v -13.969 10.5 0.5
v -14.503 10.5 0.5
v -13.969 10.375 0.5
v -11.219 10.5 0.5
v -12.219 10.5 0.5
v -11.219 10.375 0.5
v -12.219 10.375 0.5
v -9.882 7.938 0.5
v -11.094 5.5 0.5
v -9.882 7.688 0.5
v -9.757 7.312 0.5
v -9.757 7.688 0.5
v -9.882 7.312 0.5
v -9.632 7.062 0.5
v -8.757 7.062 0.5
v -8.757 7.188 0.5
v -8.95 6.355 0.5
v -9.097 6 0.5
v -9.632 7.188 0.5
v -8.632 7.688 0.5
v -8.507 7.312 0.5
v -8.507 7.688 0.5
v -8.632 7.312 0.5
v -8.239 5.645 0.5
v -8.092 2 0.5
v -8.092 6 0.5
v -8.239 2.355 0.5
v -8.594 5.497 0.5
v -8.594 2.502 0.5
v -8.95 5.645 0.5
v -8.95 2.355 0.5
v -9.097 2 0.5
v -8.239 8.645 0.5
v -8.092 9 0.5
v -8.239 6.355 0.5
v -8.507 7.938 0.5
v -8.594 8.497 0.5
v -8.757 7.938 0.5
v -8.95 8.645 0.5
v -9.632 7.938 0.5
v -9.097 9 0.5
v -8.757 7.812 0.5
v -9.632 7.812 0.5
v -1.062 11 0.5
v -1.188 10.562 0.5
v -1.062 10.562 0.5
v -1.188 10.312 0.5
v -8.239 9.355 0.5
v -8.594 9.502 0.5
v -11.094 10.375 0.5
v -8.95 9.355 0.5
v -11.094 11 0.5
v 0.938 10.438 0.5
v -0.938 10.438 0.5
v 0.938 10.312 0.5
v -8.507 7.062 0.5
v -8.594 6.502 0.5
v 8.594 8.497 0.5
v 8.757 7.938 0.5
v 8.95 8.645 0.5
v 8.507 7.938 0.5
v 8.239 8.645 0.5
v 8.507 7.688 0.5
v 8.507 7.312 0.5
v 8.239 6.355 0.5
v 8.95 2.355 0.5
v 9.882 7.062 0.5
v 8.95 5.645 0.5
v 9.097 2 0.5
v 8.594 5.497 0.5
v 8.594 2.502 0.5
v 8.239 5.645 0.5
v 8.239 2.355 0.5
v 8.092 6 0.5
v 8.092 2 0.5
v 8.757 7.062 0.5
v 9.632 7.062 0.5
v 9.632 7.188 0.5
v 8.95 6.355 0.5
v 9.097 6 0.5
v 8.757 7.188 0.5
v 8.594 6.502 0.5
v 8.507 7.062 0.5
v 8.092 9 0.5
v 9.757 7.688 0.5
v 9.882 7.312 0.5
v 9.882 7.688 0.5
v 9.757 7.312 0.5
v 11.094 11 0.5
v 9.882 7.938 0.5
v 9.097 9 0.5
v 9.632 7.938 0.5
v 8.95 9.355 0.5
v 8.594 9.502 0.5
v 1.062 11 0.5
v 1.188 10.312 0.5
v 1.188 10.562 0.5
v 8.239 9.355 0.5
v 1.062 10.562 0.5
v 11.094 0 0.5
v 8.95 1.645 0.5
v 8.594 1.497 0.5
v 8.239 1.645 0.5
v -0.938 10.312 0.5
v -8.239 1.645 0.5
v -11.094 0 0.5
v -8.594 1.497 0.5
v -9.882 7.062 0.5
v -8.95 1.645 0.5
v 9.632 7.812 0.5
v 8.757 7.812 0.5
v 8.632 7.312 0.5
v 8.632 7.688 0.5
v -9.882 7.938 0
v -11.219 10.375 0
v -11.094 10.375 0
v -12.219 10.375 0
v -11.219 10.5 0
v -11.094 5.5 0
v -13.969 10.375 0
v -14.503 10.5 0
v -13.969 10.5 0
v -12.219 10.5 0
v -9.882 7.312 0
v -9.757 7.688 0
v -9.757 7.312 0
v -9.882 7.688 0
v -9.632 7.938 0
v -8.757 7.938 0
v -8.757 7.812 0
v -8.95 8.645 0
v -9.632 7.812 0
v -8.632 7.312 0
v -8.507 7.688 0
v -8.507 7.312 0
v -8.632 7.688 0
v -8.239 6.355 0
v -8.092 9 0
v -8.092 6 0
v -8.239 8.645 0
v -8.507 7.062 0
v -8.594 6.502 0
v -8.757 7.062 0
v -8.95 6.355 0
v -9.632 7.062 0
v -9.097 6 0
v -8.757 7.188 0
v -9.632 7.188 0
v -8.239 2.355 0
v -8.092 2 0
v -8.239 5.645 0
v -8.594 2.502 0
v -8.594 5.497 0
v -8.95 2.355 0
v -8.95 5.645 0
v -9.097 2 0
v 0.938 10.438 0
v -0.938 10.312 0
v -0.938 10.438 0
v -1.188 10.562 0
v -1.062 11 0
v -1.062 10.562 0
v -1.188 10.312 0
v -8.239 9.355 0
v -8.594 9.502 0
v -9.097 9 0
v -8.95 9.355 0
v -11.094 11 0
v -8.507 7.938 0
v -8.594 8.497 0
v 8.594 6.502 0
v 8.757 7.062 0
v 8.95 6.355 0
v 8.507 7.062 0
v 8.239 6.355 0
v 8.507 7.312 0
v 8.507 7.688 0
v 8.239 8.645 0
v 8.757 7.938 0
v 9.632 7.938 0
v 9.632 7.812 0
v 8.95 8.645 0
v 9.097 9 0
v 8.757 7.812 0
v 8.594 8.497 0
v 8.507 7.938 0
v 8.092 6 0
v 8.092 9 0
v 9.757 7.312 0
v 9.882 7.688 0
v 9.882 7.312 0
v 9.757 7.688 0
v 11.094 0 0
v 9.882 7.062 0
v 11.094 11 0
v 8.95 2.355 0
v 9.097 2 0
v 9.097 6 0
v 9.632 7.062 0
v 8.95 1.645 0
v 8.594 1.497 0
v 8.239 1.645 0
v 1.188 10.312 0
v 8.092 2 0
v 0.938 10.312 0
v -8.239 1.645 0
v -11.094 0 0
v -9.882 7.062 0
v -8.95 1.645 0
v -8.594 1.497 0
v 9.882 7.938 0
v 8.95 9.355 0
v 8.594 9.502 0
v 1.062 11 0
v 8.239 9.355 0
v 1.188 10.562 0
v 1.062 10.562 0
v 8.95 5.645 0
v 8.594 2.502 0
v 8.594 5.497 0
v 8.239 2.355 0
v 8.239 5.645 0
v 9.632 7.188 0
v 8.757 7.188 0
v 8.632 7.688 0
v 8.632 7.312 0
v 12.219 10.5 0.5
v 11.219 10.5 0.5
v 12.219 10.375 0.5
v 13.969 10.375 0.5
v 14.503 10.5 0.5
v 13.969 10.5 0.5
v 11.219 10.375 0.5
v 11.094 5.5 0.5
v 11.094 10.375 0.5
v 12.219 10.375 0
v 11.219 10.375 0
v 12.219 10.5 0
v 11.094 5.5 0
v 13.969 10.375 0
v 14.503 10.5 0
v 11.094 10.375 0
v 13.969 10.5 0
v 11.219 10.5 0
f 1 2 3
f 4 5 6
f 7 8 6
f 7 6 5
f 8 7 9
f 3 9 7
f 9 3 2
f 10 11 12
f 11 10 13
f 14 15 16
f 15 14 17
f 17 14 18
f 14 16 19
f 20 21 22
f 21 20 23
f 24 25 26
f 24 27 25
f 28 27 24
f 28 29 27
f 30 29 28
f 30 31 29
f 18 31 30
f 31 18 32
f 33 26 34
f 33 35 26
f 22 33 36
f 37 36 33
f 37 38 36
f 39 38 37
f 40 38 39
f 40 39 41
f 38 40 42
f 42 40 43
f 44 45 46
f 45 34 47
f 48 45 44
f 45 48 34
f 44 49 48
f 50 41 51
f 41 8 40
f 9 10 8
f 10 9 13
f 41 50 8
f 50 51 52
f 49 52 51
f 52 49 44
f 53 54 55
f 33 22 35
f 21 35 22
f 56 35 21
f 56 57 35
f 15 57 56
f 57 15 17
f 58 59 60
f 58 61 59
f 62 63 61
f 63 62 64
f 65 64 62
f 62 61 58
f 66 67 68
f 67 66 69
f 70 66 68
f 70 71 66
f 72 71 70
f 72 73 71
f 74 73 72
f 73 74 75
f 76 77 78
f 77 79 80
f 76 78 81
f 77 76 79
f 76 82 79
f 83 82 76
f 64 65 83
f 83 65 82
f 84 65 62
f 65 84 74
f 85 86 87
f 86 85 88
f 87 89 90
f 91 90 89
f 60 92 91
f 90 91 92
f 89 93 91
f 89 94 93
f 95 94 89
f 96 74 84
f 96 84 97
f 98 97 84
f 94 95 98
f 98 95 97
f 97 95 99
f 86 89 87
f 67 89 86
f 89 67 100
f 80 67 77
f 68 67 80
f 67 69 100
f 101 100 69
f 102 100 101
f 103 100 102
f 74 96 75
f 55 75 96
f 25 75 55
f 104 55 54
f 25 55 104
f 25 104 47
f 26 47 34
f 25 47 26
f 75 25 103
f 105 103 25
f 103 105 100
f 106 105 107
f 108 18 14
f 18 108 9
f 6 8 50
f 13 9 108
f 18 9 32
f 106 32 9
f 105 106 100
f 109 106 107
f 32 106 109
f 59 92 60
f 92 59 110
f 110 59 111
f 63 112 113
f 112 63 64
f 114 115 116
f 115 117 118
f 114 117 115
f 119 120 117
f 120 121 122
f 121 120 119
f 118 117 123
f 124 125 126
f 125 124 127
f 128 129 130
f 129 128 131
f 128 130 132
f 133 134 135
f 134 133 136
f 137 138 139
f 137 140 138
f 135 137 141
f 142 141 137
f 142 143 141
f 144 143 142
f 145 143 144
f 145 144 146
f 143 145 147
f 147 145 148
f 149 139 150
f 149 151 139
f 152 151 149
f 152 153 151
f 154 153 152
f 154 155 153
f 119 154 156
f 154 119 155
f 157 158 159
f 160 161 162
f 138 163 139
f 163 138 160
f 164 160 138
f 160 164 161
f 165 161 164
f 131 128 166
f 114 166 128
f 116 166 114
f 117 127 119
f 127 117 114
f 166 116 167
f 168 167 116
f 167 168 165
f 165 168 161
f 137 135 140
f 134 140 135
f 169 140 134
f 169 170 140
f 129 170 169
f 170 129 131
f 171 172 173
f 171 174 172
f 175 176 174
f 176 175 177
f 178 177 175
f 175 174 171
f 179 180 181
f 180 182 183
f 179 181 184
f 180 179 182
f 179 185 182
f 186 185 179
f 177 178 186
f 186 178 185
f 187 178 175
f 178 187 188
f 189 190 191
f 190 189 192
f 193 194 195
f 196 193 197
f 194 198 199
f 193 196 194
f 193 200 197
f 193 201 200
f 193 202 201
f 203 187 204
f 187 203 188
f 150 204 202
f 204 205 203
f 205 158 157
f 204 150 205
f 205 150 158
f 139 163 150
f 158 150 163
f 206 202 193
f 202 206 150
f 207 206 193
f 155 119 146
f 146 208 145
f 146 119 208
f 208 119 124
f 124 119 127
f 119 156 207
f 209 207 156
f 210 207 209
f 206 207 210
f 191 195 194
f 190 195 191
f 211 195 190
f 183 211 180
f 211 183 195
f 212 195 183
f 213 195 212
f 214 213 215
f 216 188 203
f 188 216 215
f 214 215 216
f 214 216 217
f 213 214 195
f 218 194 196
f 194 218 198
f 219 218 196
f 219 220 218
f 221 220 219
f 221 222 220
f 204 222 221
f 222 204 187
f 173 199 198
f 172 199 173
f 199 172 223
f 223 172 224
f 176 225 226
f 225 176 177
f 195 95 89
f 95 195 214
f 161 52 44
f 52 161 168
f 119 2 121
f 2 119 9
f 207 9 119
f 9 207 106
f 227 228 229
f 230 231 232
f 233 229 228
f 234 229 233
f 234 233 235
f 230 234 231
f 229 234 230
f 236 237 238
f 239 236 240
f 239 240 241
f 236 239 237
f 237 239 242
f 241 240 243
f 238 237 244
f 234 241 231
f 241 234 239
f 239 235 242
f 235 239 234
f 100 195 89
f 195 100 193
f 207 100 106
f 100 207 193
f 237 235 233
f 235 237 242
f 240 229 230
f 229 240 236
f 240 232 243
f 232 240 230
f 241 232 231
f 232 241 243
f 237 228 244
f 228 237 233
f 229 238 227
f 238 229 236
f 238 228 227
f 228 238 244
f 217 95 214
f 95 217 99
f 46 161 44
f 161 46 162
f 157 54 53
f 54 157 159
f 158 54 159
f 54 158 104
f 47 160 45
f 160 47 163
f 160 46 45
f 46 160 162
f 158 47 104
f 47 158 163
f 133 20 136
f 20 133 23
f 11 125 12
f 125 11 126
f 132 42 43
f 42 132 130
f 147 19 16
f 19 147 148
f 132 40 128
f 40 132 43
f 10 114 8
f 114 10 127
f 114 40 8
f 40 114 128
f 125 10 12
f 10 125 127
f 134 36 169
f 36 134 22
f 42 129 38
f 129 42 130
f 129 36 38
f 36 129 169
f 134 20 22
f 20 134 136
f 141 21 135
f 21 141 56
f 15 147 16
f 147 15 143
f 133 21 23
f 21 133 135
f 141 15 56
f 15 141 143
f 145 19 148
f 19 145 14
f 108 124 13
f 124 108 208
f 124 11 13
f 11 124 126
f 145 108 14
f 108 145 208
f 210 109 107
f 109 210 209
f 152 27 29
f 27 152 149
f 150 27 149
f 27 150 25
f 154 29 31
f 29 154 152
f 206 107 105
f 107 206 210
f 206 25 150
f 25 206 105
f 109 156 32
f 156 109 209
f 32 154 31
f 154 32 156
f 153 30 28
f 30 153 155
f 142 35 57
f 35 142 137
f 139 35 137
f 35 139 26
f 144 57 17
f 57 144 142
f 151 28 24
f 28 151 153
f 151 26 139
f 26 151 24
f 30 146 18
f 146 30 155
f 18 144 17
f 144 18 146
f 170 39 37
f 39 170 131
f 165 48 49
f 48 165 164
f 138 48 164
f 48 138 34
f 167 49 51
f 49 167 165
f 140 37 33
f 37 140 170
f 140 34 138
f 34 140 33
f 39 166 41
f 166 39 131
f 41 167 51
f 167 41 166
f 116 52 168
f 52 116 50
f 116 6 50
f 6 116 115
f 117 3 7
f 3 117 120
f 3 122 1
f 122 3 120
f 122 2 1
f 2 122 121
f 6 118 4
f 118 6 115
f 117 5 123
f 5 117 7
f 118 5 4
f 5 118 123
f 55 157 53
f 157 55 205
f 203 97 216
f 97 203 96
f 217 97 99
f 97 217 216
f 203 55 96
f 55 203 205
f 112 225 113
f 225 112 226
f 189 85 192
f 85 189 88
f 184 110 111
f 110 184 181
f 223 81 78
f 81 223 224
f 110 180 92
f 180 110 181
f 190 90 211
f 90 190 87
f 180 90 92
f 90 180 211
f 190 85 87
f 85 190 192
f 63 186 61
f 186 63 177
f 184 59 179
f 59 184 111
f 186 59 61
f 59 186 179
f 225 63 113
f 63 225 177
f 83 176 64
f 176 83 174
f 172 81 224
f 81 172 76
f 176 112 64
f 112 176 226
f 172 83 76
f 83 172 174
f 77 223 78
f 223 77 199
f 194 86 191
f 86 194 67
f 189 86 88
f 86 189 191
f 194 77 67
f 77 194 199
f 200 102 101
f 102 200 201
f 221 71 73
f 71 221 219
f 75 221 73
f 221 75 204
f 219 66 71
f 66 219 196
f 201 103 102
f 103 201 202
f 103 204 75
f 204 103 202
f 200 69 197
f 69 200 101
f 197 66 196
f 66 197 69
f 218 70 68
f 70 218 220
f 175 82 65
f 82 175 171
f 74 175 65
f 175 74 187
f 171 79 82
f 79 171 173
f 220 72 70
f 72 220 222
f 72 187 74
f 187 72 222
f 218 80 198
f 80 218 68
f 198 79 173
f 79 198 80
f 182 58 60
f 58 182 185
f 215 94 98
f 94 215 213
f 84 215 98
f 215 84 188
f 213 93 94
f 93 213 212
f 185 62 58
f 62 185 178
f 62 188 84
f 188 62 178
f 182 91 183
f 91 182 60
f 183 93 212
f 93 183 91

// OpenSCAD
// file: modus.scad
//Corner Joint - allows the sides of two parts to create inlayed corner. Aids with welding.
//need to verify module math is the same throughout all parts.

module cornerjoint(Z,L,H,EndGap,PadL,PadH,CJangle,CJcenter){
    //change so that H = Z of inlayed part (usually 0.5)
    //add center and angle in degrees option, orgin far side of cut out area

     if((CJangle==0)&&(CJcenter==0))
      {    
        translate([0,0,0])
        rotate([0,0,CJangle])
        difference(){
        cube([L,H+PadH,Z]);
        translate([EndGap,H,0])
        cube([PadL,PadH,Z]);
        translate([L-EndGap-PadL,H,0])
        cube([PadL,PadH,Z]);}
      }    
else if((CJangle==90)&&(CJcenter==0))
      {    
        translate([H+PadH,0,0])
        rotate([0,0,CJangle])
        difference(){
        cube([L,H+PadH,Z]);
        translate([EndGap,H,0])
        cube([PadL,PadH,Z]);
        translate([L-EndGap-PadL,H,0])
        cube([PadL,PadH,Z]);}
      }
else if((CJangle==180)&&(CJcenter==0))       
      {    
        translate([L,H+PadH,0])
        rotate([0,0,CJangle])
        difference(){
        cube([L,H+PadH,Z]);
        translate([EndGap,H,0])
        cube([PadL,PadH,Z]);
        translate([L-EndGap-PadL,H,0])
        cube([PadL,PadH,Z]);}
      }
else if((CJangle==270)&&(CJcenter==0))
      {    
        translate([0,L,0])
        rotate([0,0,CJangle])
        difference(){
        cube([L,H+PadH,Z]);
        translate([EndGap,H,0])
        cube([PadL,PadH,Z]);
        translate([L-EndGap-PadL,H,0])
        cube([PadL,PadH,Z]);}
      }  
      
//centered     
   
else if((CJangle==0)&&(CJcenter==1))
      {    
        translate([-L/2,0,0])
        rotate([0,0,CJangle])
        difference(){
        cube([L,H+PadH,Z]);
        translate([EndGap,H,0])
        cube([PadL,PadH,Z]);
        translate([L-EndGap-PadL,H,0])
        cube([PadL,PadH,Z]);}
      }  
else if((CJangle==90)&&(CJcenter==1))
      {    
        translate([0,-L/2,0])
        rotate([0,0,CJangle])
        difference(){
        cube([L,H+PadH,Z]);
        translate([EndGap,H,0])
        cube([PadL,PadH,Z]);
        translate([L-EndGap-PadL,H,0])
        cube([PadL,PadH,Z]);}
      }
else if((CJangle==180)&&(CJcenter==1))       
      {    
        translate([L/2,0,0])
        rotate([0,0,CJangle])
        difference(){
        cube([L,H+PadH,Z]);
        translate([EndGap,H,0])
        cube([PadL,PadH,Z]);
        translate([L-EndGap-PadL,H,0])
        cube([PadL,PadH,Z]);}
      }
else if((CJangle==270)&&(CJcenter==1))
      {    
        translate([0,L/2,0])
        rotate([0,0,CJangle])
        difference(){
        cube([L,H+PadH,Z]);
        translate([EndGap,H,0])
        cube([PadL,PadH,Z]);
        translate([L-EndGap-PadL,H,0])
        cube([PadL,PadH,Z]);}
      }
} //end cornerjoint module

//Tab Insert - used to cut a hole for an abutting part to insert into. Typically aids with welding the two parts.
module tabinsert(X,Y,Z,dGap,cGap,c1,c2,c3,c4,c5,c6,c7,c8,center){
    translate([-dGap-(center*(X/2)),-dGap-(center*(Y/2)),0]){
        //main cut
        cube([X+(dGap*2),Y+(dGap*2),Z]);
        //corner c1c2
        translate([-cGap,(Y+(dGap*2))-c1+cGap,0])
            {
        cube([c2,c1,Z]);}
       //corner c3c4
       translate([(X+(dGap*2))-c3+cGap,(Y+(dGap*2))-c4+cGap,0]){
           cube([c3,c4,Z]);
       }
       //corner c5c6
       translate([(X+(dGap*2))-c6+cGap,-cGap,0])
      {
          cube([c6,c5,Z]);
      }
       
       //corner c7c8 
       translate([-cGap,-cGap,0]){
           cube([c7,c8,Z]);
       }
    
    } //end center translate
} //end tabinsert module
 
// file: vars.scad
brickW=6; 
brickL=12;
brickCH=6;

$fn=8; //defines resolution of circles. 8 is okay for review. 100  or greater should be used for for final dxf export.

dZstandard=0.5; //thickness of steel to be cut for drawer parts
fZstandard=0.5;
aZstandard=0.5; //thickness of steel to be cut for arm parts

fBOLTHOLEstandardD=1; //standard bolts used on frame
sliderodholeOD=1.2; 

dGap=0.03125; //gap between a hole cut's edge and the part sitting within the hole. //D3 appears to use 0.3125, is this in error?

//all parts set to standard thickness below
//off standard preferences can be defined below

//drawer
drawergap=0.0283;  //extra room for drawer to slide in the space between f1 and f4
drawerHgap=0.1884;  //total extra space from drawer sides to frame walls. sum of both sides.

d1z=dZstandard;
d2z=dZstandard;
d3z=dZstandard;
d4z=dZstandard;
d5z=dZstandard;
d6z=dZstandard;
d5z=dZstandard;
d7z=dZstandard;
d8z=dZstandard;
d9z=dZstandard;

//frame
f1x=24.2;
f1y=6;
f1z=0.5;


f2y=3.5;
f2z=fZstandard;

f3x=f1x;
f3y=3.5;
f3z=fZstandard;

f4y=11;
f4z=fZstandard;

f5y=3.5;
f5z=fZstandard;

f6y=8;
f6z=fZstandard;

f8y=brickW;
f8z=fZstandard;
f8boltD=1;

f9y=4.5;
f9x=43.5;  //set based on MAINcylinder
f9z=fZstandard;

f8x=f9x;

f11x=1.25;
f11z=fZstandard;

f13z=fZstandard;

//arms

a1x=4;
a1y=72; //calculate based on drawer cylinder
a1z=aZstandard;

a2x=6;
a2y=72;  //calculate based on drawer cylinder
a2z=aZstandard;

a4z=aZstandard;
a6z=aZstandard;

//
//Input your main cylinder's dimenions here
//
cylinderMAINminC2E=0; //main hydraulic cylinder's distance from center of mounting hole to the end of the shaft when fully compressed.
cylinderMAINmaxC2E=0; //main hydraulic cylinder's distance from center of mounting hole to the end of the shaft when fully extended.

//
//Input your drawer cylinder's dimenions here
//
cylinderDRAWERbodyH=3; //measured when in position, largest length from top to bottom of cylinder
cylinderDRAWERminC2C=0; //drawer's hydraulic cylinder's distance from the center of one mounting hole to the center of the other when fully compressed.
cylinderDRAWERmaxC2C=0; ///drawer's hydraulic cylinder's distance from the center of one mounting hole to the center of the other when fully extended.
cylinderDRAWERrodclevisW=2.5; //width of cylinders' clevis on end of rod
cylinderDRAWERrodclevisID=1;
cylinderDRAWERrodclevisOD=2;
cylinderDRAWERrearclevisW=2.5; //width of mounting clevis cylinder body
cylinderDRAWERrearclevisID=1;
cylinderDRAWERrearclevisOD=2;
cylinderDRAWERrearclevisClearance=3; //usable space around rear clevis pin (in diameter). be aware of hyraulic fittings.

//the following variables are calculated in order of dependence on preceding variables
d3x=brickL+(d2z*2);
d3y=brickCH-d1z;
d4x=brickW+d3z+d3z;
d4y=brickCH-d1z;
d5x=brickL+(d2z*2);
d5y=brickW;
d6x=brickL+(d2z*2);
d6y=brickCH;
d7x=cylinderDRAWERrearclevisClearance;
d7y=a4z+d8z+cylinderDRAWERbodyH;
d9x=cylinderDRAWERbodyH+d6z;
d9y=cylinderDRAWERbodyH+d8z;
d8x=brickL+(d2z*2);
d8y=max(5,(d9x-d6z));   //need to review fundamentals, 5 minimun unless d9 gets larger than d8
d1x=18.5;   //need to come up with a formula
d1y=18;     //need to come up with a formula
d2x=d8y+d6z+brickW+d3z+d5y+d3z;
d2y=brickCH;

f11y=f8y;
f6x=brickL+(d2z*2)+(f9y*2)+drawerHgap;
f8x=43.5;  //need to define based on MAINcylinder inputs


f2x=brickL+(d2z*2)+drawerHgap+(f9y*2)-(1.4*2);  //distance between large cut outs in f9

f5x=brickL+(d2z*2)+drawerHgap+(f9y*2)+(a1x*2); //distance between outer edges of each A1

f4x=f5x-0.5;   //same as f5 but minus 0.25 on each side to give a little overhang
// main file
include <vars.scad>;
use <modus.scad>;

f4p();

module f4p(){
    
difference(){
translate([-(((brickL+(d2z*2)+drawerHgap+(f9y*2)))/2),0,0])
    union(){
        cube([(brickL+(d2z*2)+drawerHgap+(f9y*2)),f4y,f4z]);
        translate([-((f4x-(brickL+(d2z*2)+drawerHgap+(f9y*2))))/2,f4y/2,0])
        f4triangle();
        translate([f4x-((f4x-(brickL+(d2z*2)+drawerHgap+(f9y*2)))/2),f4y/2,0])
        mirror([1,0,0])
        f4triangle();
    }
translate([-(f4x/2),0,0])
cuts();
translate([(f4x/2),0,0])
mirror([1,0,0])
cuts();
} //end difference

module cuts(){

    //f5 outer
    translate([(f4x/2)+((f5x/2)-2),f4y,0])
        cornerjoint(f4z,4,f5z,0.125,1,0.125,180,1);
        //tabinsert(4,f5z*2,f4z,0.0625,0.125,0,0,0,0,0,0,0.25,0.25,1);

    //f5 center
    translate([(f4x/2),f4y,0])
        tabinsert(2,f5z*2,f4z,0.0625,0.125,0,0,0,0,0.0,0,0.25,0.25,1);
    
    //f2
    translate([(f4x-f2x+1)/2,7.5,0])
        tabinsert(1,f2z,f6z,0.0625,0.125,0.25,0.25,0.25,0.25,0.25,0.25,0.25,0.25,1);    

    //f9 bolts
    translate([((f4x-brickL-(d2z*2)-drawerHgap)/2)-2,2,0])
        cylinder(h = f4z, r = 0.5025); //diameter 1.0?
    translate([((f4x-brickL-(d2z*2)-drawerHgap)/2)-2,6,0])
        cylinder(h = f4z, r = 0.5025);
    translate([((f4x-brickL-(d2z*2)-drawerHgap)/2)-2,9,0])
        cylinder(h = f4z, r = 0.5025);
    
} //end module

module f4triangle (){
difference(){
    cube([(f4x-(brickL+(d2z*2)+drawerHgap+(f9y*2)))/2,f4y/2,f4z]);
        difference(){
            cube([(f4x-(brickL+(d2z*2)+drawerHgap+(f9y*2)))/2,f4y/2,f4z]);
            translate([(f4x-(brickL+(d2z*2)+drawerHgap+(f9y*2)))/2,0,0])
            rotate([0,0,atan(((f4x-(brickL+(d2z*2)+drawerHgap+(f9y*2)))/2)/(f4y/2))])
                cube([10,10,f4z]);
            translate([(f4x-(brickL+(d2z*2)+drawerHgap+(f9y*2)))/2,0,0])
                cube([10,10,f4z]);
        }
    }
}  //end f4triangle module

}  //end f4p module
